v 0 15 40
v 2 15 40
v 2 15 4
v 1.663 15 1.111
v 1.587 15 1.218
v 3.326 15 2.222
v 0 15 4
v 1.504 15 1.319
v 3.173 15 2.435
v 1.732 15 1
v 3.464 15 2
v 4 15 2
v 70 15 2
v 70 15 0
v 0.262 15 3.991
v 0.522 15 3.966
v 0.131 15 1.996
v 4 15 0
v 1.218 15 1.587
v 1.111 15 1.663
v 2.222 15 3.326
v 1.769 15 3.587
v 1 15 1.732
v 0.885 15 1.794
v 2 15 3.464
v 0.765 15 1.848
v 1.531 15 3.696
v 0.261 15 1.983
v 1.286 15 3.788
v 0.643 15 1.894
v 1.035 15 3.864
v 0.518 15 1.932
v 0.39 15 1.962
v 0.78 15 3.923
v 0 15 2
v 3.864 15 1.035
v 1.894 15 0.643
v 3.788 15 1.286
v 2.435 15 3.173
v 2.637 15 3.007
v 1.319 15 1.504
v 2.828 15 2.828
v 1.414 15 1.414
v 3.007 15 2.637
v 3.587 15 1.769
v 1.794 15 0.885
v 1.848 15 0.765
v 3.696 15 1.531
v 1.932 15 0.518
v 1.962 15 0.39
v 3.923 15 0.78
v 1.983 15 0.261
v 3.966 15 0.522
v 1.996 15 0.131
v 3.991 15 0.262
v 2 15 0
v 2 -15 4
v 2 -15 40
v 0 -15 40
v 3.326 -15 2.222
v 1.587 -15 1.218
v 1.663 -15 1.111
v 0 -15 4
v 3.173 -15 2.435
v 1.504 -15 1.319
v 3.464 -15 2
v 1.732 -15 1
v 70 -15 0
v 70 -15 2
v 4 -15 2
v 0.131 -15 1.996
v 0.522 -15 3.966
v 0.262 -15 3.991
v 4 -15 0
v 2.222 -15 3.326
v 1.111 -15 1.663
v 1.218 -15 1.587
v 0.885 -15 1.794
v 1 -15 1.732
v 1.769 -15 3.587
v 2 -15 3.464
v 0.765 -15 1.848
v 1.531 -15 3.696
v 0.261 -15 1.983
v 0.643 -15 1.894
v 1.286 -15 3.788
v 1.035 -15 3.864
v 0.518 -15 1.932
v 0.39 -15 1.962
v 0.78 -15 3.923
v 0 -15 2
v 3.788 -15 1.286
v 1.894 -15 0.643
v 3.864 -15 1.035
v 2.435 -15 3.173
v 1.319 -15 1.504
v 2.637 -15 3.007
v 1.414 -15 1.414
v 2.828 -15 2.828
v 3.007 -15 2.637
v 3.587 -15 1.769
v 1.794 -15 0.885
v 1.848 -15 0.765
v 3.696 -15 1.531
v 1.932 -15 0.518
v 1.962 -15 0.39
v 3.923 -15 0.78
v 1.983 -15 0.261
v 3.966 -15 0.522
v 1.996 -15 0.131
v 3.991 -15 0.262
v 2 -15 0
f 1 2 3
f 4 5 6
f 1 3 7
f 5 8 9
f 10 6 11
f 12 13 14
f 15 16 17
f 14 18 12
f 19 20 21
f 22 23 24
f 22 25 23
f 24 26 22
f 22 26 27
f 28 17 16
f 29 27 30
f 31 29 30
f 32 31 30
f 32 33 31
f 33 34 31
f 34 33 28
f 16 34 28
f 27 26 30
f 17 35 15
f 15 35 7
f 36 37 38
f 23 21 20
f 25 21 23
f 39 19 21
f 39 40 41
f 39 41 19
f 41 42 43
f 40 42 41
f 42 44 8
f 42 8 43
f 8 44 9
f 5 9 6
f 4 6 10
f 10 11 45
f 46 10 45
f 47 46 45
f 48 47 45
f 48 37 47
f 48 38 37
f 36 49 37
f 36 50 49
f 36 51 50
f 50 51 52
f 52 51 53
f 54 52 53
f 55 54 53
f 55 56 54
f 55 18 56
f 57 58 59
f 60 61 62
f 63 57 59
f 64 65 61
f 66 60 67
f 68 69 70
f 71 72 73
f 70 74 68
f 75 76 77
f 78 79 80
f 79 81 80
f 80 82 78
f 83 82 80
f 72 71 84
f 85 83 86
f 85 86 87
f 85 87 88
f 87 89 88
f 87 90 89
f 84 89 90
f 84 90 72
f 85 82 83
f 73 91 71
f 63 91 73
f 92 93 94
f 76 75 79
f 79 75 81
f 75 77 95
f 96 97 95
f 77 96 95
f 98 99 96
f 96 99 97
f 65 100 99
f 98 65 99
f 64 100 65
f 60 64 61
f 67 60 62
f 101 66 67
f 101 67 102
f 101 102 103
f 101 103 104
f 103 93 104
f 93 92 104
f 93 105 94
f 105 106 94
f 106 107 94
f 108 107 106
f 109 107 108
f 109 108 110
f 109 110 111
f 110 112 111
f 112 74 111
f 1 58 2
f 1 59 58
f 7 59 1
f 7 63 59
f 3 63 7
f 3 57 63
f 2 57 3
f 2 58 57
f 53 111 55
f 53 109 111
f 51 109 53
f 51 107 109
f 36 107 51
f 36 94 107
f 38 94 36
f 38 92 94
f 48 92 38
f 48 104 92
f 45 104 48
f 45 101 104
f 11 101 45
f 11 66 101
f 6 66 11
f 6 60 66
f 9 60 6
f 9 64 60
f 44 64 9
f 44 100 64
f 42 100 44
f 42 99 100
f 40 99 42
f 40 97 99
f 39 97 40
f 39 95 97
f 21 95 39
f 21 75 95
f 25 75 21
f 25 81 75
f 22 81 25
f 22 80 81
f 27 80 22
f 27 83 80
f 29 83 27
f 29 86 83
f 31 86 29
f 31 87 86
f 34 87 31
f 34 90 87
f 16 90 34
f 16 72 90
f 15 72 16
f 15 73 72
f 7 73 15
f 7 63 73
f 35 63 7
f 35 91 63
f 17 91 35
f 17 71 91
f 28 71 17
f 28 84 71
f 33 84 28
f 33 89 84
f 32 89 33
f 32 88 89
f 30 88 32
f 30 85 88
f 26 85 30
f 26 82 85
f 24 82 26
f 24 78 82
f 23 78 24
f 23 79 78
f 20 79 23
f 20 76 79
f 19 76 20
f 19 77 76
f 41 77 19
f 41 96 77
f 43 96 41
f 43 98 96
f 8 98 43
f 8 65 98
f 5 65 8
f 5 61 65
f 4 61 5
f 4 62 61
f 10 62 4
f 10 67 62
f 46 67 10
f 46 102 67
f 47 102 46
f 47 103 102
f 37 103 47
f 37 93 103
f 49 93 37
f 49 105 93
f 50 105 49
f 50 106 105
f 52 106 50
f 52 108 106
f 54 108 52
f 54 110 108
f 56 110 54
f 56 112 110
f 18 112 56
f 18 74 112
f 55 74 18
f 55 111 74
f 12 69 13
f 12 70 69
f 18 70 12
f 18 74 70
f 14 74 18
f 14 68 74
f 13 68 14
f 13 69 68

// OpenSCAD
// Units: mm
$fn = 96;

thickness_mm = 2.0;
bend_radius_mm = 2.0;
k_factor = 0.45;
bend_angle_deg = 90.0;

outside_length_long_mm = 70.0;
outside_length_short_mm = 40.0;
bracket_width_mm = 30.0;

bend_allowance_mm =
    (PI / 180.0) * bend_angle_deg * (bend_radius_mm + k_factor * thickness_mm);

outside_setback_mm =
    tan(bend_angle_deg / 2.0) * (bend_radius_mm + thickness_mm);

bend_deduction_mm =
    2.0 * outside_setback_mm - bend_allowance_mm;

flat_length_mm =
    outside_length_long_mm + outside_length_short_mm - bend_deduction_mm;

echo(str(
    "MAKERBENCH-SHEETMETAL: {\"thickness_mm\": ",
    thickness_mm,
    ", \"bend_radius_mm\": ",
    bend_radius_mm,
    ", \"flat_length_mm\": ",
    flat_length_mm,
    "}"
));

module annular_sector_90(inner_r, outer_r) {
    difference() {
        circle(r = outer_r);
        circle(r = inner_r);
        translate([-outer_r - 1, -outer_r - 1])
            square([outer_r + 1, 2 * outer_r + 2]);
        translate([-outer_r - 1, -outer_r - 1])
            square([2 * outer_r + 2, outer_r + 1]);
    }
}

module l_bracket_sheetmetal() {
    rotate([90, 0, 0])
        linear_extrude(height = bracket_width_mm, center = true, convexity = 10)
            union() {
                // Horizontal flange: outside length measured to the virtual sharp outside corner.
                translate([bend_radius_mm + thickness_mm, 0])
                    square([
                        outside_length_long_mm - (bend_radius_mm + thickness_mm),
                        thickness_mm
                    ]);

                // Vertical flange: outside length measured to the virtual sharp outside corner.
                translate([0, bend_radius_mm + thickness_mm])
                    square([
                        thickness_mm,
                        outside_length_short_mm - (bend_radius_mm + thickness_mm)
                    ]);

                // Constant-thickness 90 degree bend.
                annular_sector_90(
                    bend_radius_mm,
                    bend_radius_mm + thickness_mm
                );
            }
}

l_bracket_sheetmetal();
